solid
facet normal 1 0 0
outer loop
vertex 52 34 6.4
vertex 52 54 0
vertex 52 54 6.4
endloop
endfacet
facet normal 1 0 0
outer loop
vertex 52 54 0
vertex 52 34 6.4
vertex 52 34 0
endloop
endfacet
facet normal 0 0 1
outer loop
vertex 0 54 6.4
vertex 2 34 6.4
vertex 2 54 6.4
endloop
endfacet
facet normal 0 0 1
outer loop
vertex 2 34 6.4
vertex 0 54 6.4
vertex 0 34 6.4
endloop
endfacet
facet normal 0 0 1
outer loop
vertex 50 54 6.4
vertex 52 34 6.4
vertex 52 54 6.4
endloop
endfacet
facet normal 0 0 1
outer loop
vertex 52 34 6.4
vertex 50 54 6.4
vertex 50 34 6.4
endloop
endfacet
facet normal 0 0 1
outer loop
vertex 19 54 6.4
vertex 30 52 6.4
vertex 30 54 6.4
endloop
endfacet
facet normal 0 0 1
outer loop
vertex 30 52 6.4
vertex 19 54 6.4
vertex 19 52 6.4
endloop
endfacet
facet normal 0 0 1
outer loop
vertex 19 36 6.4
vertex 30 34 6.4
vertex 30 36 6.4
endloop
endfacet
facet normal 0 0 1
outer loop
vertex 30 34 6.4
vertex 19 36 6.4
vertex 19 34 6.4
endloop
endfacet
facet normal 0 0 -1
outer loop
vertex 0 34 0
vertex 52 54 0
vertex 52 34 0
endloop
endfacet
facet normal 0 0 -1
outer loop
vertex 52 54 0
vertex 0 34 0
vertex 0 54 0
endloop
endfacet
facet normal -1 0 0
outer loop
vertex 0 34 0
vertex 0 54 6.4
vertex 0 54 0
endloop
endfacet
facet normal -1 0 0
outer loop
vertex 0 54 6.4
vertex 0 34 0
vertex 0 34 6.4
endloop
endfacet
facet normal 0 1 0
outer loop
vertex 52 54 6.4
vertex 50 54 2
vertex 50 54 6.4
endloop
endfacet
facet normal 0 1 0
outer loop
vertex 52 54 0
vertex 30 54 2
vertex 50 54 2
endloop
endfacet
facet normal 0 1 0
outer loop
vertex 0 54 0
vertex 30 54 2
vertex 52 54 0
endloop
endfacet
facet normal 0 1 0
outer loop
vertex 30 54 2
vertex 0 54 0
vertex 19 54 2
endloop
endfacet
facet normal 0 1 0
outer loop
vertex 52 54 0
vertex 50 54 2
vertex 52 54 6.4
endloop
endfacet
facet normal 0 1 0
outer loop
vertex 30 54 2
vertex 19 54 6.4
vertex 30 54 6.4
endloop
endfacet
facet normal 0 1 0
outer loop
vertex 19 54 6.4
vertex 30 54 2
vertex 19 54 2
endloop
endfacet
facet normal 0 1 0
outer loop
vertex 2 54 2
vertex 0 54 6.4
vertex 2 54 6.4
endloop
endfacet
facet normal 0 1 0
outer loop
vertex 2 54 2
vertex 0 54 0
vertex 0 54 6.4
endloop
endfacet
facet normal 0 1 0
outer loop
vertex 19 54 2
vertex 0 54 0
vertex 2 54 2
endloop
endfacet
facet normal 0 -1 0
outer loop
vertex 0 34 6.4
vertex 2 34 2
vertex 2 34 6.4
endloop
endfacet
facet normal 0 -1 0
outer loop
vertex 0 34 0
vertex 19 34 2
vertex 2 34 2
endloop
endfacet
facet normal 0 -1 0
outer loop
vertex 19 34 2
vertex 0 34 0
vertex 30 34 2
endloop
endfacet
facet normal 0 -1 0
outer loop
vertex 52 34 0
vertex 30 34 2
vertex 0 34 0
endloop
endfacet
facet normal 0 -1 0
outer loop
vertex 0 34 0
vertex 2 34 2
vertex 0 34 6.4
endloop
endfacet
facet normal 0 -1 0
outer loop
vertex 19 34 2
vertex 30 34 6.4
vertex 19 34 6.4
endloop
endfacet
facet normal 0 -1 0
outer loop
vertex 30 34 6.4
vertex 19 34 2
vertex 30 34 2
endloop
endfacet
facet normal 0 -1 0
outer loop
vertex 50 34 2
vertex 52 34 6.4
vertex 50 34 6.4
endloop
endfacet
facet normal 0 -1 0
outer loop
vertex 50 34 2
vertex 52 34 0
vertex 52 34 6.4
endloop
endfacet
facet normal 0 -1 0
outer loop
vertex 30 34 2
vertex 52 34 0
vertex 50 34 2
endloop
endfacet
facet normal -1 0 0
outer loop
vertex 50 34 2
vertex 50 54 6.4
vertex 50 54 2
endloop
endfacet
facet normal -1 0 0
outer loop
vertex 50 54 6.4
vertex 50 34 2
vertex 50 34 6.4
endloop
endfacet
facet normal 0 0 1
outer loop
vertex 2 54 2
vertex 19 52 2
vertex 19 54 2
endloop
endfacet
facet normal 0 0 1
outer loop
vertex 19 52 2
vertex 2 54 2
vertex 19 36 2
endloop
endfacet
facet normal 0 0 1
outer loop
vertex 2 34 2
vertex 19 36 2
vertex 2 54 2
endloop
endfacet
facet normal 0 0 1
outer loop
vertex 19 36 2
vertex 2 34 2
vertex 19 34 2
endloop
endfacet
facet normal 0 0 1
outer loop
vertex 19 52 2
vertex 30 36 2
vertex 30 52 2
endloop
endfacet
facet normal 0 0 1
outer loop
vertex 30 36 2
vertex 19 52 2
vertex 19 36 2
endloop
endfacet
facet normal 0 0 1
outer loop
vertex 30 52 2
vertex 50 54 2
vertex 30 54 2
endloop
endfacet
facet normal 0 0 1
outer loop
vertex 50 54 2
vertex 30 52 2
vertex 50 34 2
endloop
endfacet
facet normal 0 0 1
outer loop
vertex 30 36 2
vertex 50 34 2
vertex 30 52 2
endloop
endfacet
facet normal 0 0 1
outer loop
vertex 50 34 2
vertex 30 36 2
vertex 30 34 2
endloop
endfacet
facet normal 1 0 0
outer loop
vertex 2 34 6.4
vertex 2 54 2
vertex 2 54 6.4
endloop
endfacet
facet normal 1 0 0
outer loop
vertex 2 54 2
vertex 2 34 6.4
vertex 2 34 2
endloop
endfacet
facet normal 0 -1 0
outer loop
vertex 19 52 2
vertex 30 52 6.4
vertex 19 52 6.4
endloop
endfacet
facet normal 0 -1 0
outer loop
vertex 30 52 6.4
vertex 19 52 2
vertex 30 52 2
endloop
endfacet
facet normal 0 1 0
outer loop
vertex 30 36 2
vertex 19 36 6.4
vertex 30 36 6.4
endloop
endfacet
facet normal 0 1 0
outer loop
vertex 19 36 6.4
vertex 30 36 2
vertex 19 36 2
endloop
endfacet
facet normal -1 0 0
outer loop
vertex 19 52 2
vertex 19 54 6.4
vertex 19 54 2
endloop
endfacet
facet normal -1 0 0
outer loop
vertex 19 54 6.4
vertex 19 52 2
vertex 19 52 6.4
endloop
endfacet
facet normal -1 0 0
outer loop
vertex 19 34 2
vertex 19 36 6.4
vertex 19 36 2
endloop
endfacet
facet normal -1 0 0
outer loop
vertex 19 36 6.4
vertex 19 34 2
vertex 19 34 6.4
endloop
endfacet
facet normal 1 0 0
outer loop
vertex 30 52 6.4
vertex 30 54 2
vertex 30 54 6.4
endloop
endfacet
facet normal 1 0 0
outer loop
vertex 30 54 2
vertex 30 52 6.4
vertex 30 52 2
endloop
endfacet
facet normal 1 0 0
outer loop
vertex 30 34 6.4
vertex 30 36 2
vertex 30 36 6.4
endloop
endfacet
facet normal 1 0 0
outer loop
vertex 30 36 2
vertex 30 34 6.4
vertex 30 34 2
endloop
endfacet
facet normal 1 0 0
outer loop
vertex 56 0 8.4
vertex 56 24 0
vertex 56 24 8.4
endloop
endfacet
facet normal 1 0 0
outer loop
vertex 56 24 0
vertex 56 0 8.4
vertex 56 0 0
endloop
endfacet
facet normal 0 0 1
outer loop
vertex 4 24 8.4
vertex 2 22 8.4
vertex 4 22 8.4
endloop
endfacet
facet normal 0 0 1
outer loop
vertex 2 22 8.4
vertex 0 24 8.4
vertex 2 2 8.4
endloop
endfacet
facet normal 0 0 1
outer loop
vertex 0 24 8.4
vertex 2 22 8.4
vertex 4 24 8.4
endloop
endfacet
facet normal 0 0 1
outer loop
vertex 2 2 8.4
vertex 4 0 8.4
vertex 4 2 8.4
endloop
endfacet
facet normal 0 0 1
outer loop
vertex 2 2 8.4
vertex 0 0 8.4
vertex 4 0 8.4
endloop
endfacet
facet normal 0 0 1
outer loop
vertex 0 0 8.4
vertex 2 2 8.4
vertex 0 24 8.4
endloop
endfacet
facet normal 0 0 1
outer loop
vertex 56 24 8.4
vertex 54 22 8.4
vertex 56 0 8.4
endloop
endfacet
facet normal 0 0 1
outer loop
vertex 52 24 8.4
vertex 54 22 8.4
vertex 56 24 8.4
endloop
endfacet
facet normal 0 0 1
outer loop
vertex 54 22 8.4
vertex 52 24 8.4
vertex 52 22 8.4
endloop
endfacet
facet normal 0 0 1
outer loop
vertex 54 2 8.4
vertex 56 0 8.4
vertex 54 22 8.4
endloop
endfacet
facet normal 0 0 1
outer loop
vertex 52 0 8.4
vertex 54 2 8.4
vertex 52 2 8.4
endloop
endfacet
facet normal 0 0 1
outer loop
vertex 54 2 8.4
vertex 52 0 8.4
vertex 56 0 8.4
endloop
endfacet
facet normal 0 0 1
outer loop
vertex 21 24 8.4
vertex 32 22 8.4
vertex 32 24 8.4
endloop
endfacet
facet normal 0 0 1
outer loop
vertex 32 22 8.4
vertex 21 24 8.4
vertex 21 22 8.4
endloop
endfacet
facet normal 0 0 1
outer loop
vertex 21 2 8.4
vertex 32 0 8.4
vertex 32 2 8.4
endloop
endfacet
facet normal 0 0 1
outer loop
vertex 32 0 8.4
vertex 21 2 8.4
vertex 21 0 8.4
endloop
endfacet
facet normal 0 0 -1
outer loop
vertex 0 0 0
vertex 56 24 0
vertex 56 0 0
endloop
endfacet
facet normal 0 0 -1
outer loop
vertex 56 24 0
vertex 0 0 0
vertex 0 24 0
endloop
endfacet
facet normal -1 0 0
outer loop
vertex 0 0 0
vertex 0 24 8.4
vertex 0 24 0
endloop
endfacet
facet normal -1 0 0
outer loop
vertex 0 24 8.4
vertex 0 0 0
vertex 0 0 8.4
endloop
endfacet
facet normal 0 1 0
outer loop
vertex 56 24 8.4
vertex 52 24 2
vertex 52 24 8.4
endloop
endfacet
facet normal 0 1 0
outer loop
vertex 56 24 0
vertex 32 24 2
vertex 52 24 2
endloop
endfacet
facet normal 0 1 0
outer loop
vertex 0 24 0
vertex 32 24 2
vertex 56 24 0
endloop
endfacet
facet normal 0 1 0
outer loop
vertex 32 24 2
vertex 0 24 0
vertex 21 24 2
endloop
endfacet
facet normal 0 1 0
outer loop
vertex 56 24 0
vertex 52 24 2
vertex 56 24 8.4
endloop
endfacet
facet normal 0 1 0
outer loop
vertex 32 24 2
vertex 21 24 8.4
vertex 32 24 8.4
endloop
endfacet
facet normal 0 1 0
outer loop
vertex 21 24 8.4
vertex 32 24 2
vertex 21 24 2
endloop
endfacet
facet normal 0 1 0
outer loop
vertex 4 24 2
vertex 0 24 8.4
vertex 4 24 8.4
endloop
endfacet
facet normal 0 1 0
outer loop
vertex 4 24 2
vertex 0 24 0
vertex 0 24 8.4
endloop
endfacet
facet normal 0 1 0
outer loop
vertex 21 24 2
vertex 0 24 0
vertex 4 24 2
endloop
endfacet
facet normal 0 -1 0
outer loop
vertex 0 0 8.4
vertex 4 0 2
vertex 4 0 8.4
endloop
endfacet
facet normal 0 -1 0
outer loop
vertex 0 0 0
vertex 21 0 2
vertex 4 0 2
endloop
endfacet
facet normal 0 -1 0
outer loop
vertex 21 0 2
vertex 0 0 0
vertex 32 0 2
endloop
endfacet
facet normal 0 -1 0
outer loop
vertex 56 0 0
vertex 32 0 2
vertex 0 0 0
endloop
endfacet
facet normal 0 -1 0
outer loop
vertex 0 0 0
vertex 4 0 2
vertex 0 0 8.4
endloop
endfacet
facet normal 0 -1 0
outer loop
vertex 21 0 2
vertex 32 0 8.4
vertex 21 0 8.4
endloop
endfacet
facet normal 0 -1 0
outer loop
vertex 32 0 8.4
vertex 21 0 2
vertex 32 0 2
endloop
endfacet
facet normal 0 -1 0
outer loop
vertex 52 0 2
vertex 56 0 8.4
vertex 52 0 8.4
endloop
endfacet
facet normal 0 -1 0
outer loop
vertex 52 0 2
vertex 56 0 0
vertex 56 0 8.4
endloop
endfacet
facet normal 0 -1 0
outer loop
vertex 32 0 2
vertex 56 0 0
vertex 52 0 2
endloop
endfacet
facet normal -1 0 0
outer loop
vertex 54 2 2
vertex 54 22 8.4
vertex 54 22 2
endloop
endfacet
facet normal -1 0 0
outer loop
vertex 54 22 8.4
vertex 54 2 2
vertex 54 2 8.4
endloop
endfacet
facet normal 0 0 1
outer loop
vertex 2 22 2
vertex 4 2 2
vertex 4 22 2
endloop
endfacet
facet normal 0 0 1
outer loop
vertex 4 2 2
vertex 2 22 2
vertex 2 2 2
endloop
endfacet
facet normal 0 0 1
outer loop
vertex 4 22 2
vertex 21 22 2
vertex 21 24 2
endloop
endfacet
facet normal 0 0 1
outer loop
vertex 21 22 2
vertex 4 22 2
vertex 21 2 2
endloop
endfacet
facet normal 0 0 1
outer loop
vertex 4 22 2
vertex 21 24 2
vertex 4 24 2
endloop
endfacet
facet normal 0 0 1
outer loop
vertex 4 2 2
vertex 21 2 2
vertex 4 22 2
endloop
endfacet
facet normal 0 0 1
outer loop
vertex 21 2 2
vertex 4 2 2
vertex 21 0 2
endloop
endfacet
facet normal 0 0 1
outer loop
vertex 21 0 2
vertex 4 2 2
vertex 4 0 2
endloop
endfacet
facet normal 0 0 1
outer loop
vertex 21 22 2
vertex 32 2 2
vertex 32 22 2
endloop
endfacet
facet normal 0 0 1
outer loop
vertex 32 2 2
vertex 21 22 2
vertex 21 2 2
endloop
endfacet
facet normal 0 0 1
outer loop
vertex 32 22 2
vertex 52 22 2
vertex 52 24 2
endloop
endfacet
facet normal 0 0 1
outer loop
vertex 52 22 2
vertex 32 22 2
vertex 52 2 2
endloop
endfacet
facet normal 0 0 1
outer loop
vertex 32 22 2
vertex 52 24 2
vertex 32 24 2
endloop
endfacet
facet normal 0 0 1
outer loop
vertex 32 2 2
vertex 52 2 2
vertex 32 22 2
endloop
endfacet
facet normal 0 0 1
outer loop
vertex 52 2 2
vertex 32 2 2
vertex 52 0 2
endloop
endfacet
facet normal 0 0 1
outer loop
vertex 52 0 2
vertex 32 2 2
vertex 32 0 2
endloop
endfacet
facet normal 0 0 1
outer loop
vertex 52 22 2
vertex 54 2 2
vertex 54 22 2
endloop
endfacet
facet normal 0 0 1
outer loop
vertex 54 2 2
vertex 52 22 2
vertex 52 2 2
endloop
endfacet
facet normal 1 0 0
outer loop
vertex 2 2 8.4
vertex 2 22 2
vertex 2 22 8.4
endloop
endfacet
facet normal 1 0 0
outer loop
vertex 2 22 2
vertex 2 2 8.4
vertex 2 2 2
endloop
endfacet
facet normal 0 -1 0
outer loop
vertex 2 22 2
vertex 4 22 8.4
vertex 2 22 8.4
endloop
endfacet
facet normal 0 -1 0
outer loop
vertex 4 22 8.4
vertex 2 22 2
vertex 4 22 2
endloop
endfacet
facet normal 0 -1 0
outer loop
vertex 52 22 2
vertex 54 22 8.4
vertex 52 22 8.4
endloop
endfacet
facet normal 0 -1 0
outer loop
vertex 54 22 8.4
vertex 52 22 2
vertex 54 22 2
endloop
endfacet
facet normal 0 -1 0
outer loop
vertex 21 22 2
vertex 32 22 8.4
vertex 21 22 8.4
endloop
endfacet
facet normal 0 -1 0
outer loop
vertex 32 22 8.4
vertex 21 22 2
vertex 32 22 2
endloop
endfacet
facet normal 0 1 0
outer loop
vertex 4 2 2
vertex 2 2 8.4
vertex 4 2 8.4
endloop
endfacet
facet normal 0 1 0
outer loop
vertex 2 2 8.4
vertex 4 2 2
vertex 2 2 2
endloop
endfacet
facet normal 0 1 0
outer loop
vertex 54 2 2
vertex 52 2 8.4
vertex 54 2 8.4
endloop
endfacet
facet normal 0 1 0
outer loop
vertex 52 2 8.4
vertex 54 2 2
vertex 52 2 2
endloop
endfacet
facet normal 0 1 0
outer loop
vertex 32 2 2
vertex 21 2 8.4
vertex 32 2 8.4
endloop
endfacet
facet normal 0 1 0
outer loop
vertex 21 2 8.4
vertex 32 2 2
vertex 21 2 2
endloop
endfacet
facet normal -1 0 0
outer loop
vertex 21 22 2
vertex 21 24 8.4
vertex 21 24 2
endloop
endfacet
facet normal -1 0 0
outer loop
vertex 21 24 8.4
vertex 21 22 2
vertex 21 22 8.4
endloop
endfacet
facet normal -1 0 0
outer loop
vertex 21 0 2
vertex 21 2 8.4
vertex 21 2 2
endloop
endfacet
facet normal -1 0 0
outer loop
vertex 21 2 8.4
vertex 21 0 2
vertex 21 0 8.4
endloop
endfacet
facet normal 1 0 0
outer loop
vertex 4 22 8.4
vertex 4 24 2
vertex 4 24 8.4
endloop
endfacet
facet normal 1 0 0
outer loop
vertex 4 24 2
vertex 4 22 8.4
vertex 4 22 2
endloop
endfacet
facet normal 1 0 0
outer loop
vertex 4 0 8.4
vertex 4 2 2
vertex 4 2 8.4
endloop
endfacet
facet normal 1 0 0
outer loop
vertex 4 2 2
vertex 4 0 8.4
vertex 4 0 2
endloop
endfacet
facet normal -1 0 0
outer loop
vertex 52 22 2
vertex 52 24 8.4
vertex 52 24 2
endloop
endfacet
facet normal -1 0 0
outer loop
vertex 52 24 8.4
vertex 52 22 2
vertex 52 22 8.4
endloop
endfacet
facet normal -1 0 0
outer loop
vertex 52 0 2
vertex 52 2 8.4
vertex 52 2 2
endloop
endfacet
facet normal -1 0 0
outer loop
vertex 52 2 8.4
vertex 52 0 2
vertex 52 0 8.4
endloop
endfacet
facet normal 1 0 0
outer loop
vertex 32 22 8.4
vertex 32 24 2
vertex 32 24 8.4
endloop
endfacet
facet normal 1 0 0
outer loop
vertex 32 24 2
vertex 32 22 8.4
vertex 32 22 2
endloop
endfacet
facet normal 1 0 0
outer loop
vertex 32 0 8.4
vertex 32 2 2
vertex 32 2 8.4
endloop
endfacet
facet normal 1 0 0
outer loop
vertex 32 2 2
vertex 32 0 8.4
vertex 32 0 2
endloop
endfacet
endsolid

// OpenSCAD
width = 48;
height = 16;

left_space = 17;
right_space = 20;
board_thickness = 1.4;
cables_height = 3;
thickness = 2;
space_between_parts = 10;

hole_depth = board_thickness + cables_height;

//assembled_parts();
individual_parts();

module individual_parts() {
    translate([0, height + thickness * 4 + space_between_parts, 0])
        bottom_part();
    top_part();
}

module assembled_parts() {
    translate([thickness, height + thickness * 3, thickness * 2 + hole_depth])
        rotate([180, 0 , 0])
            bottom_part();
    top_part();
}

module top_part() {
    difference() {
        cube([width + thickness * 4, height + thickness * 4, hole_depth + thickness * 2]);

        translate([thickness, thickness, thickness])
            cube([width + thickness * 2, height + thickness * 2, hole_depth + thickness]);
        translate([thickness * 2, 0, thickness])
            cube([left_space, height + thickness * 4, hole_depth + thickness]);
        translate([thickness * 2 + width - right_space, 0, thickness])
            cube([right_space, height + thickness * 4, hole_depth + thickness]);
    }
}

module bottom_part() {
    difference() {
        cube([width + thickness * 2, height + thickness * 2, hole_depth + thickness]);

        translate([thickness, thickness, thickness])
            cube([width, height, hole_depth]);
        translate([thickness, 0, thickness])
            cube([left_space, height + thickness * 2, hole_depth]);
        translate([thickness + width - right_space, 0, thickness])
            cube([right_space, height + thickness * 2, hole_depth]);
    }
}
